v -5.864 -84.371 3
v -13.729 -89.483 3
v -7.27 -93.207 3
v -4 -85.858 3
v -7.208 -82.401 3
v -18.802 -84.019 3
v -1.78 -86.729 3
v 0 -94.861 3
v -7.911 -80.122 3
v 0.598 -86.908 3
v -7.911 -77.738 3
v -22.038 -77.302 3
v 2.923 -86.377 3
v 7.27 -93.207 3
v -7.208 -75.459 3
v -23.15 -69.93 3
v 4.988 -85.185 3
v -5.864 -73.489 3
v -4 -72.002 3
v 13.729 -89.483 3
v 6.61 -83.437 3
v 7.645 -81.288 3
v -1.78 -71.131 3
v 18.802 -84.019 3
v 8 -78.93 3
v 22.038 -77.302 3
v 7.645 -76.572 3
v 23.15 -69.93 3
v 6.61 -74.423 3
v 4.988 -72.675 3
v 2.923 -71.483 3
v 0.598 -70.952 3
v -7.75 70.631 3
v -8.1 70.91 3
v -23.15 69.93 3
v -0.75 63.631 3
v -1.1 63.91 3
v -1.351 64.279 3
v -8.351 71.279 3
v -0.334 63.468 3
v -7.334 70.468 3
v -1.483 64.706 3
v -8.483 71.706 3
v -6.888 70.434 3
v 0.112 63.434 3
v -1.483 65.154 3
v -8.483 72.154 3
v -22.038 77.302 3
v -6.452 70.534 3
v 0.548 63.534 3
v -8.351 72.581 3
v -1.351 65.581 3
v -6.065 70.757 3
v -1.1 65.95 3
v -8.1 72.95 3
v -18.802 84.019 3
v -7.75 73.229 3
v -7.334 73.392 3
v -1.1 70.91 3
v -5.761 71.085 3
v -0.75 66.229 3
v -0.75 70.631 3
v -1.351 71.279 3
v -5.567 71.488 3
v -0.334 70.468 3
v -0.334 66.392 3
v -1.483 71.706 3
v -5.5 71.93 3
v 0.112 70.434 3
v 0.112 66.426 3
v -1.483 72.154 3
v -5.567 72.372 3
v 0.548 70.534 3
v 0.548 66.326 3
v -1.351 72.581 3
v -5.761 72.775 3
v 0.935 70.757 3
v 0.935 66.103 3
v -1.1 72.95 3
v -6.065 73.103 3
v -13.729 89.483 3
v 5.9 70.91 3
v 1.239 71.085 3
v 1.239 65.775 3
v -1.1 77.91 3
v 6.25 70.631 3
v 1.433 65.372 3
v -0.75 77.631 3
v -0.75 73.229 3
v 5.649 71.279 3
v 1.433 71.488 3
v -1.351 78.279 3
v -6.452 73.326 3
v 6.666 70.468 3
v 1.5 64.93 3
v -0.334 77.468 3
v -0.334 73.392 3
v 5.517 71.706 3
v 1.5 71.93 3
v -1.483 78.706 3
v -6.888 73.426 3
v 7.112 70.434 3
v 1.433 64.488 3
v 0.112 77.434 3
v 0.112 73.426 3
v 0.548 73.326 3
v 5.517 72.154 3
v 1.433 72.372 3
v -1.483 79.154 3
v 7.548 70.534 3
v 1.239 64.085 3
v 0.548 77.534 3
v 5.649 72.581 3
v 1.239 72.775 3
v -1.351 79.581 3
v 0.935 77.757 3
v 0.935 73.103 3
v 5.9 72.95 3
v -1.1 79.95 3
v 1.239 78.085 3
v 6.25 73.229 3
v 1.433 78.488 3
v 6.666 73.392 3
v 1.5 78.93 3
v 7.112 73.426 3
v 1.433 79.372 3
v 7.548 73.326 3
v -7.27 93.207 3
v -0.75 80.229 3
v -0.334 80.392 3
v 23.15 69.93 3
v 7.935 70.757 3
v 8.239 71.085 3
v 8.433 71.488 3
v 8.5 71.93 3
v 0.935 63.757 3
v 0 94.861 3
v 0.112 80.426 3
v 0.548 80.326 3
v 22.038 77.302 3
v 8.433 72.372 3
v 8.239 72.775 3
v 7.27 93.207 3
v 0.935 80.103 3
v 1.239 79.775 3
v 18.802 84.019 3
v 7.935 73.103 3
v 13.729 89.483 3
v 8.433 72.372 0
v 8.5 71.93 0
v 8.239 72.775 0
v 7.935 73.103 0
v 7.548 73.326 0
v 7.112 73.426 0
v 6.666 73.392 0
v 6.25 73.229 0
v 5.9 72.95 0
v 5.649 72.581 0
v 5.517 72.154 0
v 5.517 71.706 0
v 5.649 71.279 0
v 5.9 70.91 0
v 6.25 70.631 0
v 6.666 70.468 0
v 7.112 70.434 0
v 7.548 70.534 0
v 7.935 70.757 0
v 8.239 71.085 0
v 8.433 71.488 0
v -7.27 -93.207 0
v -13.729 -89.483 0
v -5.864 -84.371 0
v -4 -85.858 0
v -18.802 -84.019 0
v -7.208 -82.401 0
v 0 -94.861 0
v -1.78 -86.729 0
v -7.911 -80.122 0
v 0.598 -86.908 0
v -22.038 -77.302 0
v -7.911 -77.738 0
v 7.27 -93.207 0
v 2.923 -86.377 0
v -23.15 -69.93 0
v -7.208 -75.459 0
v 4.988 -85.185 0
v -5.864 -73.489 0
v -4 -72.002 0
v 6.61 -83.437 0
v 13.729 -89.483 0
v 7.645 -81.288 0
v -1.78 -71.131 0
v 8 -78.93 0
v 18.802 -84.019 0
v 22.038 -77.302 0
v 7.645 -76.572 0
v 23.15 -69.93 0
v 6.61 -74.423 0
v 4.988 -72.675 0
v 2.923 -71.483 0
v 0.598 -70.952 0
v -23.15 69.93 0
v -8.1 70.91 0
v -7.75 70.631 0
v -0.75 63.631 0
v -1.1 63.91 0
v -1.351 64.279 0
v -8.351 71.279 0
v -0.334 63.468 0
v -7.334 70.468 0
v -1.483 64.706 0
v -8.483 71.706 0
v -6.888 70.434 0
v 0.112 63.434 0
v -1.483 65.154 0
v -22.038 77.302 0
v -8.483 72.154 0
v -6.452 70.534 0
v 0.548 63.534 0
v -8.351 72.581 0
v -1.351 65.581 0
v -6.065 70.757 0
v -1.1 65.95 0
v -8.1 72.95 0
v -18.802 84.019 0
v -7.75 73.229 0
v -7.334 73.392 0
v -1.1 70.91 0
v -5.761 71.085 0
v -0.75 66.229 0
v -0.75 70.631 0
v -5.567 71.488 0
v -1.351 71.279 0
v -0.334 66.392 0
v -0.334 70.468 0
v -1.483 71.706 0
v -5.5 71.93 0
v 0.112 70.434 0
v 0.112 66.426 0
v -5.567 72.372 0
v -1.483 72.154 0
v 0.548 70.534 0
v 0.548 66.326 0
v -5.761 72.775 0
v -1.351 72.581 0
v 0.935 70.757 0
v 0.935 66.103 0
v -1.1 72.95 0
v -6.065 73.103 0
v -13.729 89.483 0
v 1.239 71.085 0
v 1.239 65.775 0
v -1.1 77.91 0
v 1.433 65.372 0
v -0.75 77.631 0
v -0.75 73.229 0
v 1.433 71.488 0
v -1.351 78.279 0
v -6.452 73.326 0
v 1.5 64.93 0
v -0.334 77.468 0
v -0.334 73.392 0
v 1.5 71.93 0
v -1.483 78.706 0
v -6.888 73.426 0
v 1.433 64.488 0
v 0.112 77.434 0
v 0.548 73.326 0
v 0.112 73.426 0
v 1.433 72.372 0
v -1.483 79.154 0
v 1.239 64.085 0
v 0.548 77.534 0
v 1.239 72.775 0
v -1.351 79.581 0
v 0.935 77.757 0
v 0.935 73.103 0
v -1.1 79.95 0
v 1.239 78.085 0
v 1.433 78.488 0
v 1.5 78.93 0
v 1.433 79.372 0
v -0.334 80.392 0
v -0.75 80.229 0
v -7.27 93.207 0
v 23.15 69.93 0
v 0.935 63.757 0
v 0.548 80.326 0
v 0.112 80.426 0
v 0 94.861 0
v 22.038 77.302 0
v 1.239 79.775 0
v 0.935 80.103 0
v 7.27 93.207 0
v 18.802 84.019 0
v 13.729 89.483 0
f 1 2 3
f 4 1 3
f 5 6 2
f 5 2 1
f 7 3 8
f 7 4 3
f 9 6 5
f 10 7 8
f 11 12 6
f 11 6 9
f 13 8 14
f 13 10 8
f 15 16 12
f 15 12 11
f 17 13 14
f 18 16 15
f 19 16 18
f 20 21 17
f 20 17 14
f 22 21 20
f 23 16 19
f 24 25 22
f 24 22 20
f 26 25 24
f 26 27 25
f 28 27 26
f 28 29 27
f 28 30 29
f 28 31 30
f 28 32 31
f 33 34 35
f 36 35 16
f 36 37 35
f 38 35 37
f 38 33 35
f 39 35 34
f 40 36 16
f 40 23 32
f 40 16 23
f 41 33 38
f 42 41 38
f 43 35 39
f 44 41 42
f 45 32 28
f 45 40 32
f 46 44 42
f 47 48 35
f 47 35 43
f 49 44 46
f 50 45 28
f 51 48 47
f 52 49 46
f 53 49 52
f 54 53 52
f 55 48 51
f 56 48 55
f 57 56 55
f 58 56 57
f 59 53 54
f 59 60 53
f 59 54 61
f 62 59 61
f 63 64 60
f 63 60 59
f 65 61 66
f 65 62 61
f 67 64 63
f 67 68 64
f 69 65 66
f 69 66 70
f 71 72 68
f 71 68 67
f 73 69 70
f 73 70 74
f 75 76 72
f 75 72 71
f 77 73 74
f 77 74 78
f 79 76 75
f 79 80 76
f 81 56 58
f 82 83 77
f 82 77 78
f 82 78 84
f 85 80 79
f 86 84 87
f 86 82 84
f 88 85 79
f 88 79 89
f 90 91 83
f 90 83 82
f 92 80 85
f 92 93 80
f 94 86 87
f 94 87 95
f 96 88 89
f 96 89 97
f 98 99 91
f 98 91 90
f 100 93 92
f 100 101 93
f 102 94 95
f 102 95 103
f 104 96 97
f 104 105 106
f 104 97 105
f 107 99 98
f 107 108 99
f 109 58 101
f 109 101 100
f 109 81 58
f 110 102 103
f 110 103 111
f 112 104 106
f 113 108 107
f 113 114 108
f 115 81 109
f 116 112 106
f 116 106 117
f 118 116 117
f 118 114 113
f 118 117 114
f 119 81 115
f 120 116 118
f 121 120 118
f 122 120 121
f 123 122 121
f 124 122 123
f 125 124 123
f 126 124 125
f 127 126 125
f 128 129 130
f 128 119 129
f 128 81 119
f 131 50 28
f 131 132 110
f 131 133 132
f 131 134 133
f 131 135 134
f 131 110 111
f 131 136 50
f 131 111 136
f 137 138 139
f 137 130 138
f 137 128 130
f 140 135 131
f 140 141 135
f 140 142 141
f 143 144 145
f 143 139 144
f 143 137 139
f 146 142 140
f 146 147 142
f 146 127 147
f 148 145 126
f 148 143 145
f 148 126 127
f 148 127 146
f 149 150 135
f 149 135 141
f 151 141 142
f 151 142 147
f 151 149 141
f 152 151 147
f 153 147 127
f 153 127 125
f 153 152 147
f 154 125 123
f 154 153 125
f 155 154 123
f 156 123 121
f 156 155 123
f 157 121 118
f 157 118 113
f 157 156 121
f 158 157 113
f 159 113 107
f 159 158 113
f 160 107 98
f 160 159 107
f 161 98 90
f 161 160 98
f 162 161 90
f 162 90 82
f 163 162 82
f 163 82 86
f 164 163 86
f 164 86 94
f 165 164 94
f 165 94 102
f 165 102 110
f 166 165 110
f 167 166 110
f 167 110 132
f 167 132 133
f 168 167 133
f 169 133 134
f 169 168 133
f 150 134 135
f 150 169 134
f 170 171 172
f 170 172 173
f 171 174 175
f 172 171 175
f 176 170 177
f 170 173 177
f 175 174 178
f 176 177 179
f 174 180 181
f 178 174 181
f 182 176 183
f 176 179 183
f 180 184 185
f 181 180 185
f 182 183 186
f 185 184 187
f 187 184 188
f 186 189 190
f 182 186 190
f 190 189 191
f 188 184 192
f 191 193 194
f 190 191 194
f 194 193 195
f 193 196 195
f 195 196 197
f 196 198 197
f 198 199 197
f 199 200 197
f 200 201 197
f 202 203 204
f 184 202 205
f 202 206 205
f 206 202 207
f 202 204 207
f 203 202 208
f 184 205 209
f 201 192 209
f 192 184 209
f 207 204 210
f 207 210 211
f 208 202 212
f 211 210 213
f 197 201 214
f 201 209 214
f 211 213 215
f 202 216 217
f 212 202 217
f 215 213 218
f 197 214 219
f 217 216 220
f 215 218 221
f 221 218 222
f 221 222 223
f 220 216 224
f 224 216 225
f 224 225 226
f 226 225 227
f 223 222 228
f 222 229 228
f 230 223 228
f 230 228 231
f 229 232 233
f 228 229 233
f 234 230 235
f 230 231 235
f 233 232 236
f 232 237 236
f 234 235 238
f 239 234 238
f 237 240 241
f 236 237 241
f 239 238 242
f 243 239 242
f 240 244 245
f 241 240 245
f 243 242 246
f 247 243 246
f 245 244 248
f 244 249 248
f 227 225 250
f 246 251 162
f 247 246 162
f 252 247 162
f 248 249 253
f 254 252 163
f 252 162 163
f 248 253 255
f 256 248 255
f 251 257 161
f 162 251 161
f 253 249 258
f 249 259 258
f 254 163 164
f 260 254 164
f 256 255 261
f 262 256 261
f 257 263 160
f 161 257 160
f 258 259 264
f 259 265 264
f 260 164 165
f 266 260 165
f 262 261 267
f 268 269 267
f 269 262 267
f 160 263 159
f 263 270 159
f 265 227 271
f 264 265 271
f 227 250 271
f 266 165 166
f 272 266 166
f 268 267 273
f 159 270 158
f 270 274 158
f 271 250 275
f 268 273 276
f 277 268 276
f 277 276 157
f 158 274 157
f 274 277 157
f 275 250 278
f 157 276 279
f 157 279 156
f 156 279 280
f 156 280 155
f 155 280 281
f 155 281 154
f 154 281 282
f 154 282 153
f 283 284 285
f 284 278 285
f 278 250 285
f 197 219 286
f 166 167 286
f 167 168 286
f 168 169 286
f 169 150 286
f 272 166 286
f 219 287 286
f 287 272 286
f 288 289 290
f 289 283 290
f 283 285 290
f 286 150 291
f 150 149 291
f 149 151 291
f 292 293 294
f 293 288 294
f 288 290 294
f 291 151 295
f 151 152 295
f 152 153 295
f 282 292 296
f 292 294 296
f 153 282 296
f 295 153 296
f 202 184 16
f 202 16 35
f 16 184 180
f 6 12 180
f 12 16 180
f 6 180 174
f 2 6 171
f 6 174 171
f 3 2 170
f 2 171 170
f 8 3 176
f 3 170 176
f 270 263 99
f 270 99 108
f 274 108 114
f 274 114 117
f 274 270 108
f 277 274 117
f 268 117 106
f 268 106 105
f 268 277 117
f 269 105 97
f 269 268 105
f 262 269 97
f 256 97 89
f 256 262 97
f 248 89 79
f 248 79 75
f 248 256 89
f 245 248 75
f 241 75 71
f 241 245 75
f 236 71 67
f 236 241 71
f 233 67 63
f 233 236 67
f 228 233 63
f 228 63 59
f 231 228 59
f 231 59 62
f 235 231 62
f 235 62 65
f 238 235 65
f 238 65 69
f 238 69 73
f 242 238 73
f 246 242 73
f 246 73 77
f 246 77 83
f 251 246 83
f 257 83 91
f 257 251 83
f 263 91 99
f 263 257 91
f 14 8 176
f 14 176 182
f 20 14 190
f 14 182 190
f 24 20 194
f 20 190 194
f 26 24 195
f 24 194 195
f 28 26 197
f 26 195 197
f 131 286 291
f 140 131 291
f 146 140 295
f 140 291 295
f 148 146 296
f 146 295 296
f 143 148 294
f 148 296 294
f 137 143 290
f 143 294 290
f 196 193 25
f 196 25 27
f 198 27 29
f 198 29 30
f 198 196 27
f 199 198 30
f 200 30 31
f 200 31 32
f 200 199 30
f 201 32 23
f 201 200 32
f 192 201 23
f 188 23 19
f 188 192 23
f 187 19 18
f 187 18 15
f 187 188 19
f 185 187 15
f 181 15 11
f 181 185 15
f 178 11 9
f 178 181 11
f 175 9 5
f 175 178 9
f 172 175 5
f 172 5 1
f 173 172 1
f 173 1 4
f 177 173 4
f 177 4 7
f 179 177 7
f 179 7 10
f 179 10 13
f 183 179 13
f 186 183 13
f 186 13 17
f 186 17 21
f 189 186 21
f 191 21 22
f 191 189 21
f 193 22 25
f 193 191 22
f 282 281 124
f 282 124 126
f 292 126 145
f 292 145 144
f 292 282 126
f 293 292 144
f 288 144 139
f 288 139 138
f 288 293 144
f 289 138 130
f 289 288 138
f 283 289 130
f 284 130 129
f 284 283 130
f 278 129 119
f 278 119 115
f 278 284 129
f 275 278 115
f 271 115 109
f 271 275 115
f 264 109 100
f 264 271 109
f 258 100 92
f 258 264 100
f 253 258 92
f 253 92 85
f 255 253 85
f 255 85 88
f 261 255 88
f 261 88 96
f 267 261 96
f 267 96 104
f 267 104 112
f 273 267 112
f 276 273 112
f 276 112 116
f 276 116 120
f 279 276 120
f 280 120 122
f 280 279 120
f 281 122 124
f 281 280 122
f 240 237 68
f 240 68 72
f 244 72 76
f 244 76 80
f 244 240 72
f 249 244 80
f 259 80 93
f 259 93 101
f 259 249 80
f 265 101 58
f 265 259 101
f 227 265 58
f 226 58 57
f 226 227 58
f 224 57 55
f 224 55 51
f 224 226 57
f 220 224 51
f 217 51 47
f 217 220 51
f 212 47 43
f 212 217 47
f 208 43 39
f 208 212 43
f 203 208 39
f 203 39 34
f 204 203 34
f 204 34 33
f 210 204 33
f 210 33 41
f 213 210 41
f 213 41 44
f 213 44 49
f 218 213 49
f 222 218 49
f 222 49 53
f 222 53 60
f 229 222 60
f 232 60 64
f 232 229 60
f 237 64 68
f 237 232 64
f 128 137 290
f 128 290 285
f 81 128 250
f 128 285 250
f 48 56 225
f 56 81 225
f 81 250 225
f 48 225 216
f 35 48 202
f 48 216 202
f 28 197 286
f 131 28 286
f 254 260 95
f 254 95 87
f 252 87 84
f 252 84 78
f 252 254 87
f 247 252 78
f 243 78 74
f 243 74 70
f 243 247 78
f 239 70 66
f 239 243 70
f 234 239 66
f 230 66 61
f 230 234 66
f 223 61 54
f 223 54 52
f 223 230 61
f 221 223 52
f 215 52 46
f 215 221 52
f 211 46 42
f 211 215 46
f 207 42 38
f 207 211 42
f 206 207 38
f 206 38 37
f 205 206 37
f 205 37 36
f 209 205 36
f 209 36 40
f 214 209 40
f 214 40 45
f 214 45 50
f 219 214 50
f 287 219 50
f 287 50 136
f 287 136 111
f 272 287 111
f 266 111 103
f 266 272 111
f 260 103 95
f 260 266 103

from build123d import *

# Parameters (mm, degrees)
SKETCH1_W           = 46.3
SKETCH1_H           = 189.86
SKETCH1_R           = 10.5
SKETCH1_R_2         = 8
SKETCH1_R_3         = 1.5
BOSS_EXTRUDE1_DEPTH = 3
FILLET1_R           = 25


with BuildPart() as part:
    # Sketch1 → Boss-Extrude1 (new body)
    # profile 1 of 2: a face of its own
    with BuildSketch(Plane.XY):
        Rectangle(SKETCH1_W, SKETCH1_H)
        with Locations((0, 71.93)):
            Circle(SKETCH1_R, mode=Mode.SUBTRACT)
        with Locations((0, -78.93)):
            Circle(SKETCH1_R_2, mode=Mode.SUBTRACT)
    # profile 2 of 2: a face of its own
    with BuildSketch(Plane.XY):
        with Locations((0, 71.93)):
            Circle(SKETCH1_R)
        with Locations((0, 78.93)):
            Circle(SKETCH1_R_3, mode=Mode.SUBTRACT)
        with Locations((7, 71.93)):
            Circle(SKETCH1_R_3, mode=Mode.SUBTRACT)
        with Locations((0, 64.93)):
            Circle(SKETCH1_R_3, mode=Mode.SUBTRACT)
        with Locations((-7, 71.93)):
            Circle(SKETCH1_R_3, mode=Mode.SUBTRACT)
        with Locations((0, 71.93)):
            Circle(SKETCH1_R_3, mode=Mode.SUBTRACT)
    extrude(amount=BOSS_EXTRUDE1_DEPTH)

    # Fillet1
    # the kernel refuses this fillet: 25 mm, written as the material it takes off along each edge
    with BuildSketch(Plane(origin=(-23.15, -94.93, -62.5), x_dir=(0, 1, 0), z_dir=(0, 0, 1)), Plane(origin=(23.15, -94.93, -62.5), x_dir=(-1, 0, 0), z_dir=(0, 0, 1))) as fillet1_piece_1:
        with BuildLine():
            CenterArc((FILLET1_R, -FILLET1_R), FILLET1_R, 90, 90)
            Line((0, -FILLET1_R), (0, 0))
            Line((0, 0), (FILLET1_R, 0))
        make_face()
    extrude(amount=128, mode=Mode.SUBTRACT)
    with BuildSketch(Plane(origin=(-23.15, 94.93, -62.5), x_dir=(0, -1, 0), z_dir=(0, 0, 1)), Plane(origin=(23.15, 94.93, -62.5), x_dir=(-1, 0, 0), z_dir=(0, 0, 1))) as fillet1_piece_2:
        with BuildLine():
            CenterArc((FILLET1_R, FILLET1_R), FILLET1_R, 180, 90)
            Line((0, FILLET1_R), (0, 0))
            Line((0, 0), (FILLET1_R, 0))
        make_face()
    extrude(amount=128, mode=Mode.SUBTRACT)


solid = part.part
